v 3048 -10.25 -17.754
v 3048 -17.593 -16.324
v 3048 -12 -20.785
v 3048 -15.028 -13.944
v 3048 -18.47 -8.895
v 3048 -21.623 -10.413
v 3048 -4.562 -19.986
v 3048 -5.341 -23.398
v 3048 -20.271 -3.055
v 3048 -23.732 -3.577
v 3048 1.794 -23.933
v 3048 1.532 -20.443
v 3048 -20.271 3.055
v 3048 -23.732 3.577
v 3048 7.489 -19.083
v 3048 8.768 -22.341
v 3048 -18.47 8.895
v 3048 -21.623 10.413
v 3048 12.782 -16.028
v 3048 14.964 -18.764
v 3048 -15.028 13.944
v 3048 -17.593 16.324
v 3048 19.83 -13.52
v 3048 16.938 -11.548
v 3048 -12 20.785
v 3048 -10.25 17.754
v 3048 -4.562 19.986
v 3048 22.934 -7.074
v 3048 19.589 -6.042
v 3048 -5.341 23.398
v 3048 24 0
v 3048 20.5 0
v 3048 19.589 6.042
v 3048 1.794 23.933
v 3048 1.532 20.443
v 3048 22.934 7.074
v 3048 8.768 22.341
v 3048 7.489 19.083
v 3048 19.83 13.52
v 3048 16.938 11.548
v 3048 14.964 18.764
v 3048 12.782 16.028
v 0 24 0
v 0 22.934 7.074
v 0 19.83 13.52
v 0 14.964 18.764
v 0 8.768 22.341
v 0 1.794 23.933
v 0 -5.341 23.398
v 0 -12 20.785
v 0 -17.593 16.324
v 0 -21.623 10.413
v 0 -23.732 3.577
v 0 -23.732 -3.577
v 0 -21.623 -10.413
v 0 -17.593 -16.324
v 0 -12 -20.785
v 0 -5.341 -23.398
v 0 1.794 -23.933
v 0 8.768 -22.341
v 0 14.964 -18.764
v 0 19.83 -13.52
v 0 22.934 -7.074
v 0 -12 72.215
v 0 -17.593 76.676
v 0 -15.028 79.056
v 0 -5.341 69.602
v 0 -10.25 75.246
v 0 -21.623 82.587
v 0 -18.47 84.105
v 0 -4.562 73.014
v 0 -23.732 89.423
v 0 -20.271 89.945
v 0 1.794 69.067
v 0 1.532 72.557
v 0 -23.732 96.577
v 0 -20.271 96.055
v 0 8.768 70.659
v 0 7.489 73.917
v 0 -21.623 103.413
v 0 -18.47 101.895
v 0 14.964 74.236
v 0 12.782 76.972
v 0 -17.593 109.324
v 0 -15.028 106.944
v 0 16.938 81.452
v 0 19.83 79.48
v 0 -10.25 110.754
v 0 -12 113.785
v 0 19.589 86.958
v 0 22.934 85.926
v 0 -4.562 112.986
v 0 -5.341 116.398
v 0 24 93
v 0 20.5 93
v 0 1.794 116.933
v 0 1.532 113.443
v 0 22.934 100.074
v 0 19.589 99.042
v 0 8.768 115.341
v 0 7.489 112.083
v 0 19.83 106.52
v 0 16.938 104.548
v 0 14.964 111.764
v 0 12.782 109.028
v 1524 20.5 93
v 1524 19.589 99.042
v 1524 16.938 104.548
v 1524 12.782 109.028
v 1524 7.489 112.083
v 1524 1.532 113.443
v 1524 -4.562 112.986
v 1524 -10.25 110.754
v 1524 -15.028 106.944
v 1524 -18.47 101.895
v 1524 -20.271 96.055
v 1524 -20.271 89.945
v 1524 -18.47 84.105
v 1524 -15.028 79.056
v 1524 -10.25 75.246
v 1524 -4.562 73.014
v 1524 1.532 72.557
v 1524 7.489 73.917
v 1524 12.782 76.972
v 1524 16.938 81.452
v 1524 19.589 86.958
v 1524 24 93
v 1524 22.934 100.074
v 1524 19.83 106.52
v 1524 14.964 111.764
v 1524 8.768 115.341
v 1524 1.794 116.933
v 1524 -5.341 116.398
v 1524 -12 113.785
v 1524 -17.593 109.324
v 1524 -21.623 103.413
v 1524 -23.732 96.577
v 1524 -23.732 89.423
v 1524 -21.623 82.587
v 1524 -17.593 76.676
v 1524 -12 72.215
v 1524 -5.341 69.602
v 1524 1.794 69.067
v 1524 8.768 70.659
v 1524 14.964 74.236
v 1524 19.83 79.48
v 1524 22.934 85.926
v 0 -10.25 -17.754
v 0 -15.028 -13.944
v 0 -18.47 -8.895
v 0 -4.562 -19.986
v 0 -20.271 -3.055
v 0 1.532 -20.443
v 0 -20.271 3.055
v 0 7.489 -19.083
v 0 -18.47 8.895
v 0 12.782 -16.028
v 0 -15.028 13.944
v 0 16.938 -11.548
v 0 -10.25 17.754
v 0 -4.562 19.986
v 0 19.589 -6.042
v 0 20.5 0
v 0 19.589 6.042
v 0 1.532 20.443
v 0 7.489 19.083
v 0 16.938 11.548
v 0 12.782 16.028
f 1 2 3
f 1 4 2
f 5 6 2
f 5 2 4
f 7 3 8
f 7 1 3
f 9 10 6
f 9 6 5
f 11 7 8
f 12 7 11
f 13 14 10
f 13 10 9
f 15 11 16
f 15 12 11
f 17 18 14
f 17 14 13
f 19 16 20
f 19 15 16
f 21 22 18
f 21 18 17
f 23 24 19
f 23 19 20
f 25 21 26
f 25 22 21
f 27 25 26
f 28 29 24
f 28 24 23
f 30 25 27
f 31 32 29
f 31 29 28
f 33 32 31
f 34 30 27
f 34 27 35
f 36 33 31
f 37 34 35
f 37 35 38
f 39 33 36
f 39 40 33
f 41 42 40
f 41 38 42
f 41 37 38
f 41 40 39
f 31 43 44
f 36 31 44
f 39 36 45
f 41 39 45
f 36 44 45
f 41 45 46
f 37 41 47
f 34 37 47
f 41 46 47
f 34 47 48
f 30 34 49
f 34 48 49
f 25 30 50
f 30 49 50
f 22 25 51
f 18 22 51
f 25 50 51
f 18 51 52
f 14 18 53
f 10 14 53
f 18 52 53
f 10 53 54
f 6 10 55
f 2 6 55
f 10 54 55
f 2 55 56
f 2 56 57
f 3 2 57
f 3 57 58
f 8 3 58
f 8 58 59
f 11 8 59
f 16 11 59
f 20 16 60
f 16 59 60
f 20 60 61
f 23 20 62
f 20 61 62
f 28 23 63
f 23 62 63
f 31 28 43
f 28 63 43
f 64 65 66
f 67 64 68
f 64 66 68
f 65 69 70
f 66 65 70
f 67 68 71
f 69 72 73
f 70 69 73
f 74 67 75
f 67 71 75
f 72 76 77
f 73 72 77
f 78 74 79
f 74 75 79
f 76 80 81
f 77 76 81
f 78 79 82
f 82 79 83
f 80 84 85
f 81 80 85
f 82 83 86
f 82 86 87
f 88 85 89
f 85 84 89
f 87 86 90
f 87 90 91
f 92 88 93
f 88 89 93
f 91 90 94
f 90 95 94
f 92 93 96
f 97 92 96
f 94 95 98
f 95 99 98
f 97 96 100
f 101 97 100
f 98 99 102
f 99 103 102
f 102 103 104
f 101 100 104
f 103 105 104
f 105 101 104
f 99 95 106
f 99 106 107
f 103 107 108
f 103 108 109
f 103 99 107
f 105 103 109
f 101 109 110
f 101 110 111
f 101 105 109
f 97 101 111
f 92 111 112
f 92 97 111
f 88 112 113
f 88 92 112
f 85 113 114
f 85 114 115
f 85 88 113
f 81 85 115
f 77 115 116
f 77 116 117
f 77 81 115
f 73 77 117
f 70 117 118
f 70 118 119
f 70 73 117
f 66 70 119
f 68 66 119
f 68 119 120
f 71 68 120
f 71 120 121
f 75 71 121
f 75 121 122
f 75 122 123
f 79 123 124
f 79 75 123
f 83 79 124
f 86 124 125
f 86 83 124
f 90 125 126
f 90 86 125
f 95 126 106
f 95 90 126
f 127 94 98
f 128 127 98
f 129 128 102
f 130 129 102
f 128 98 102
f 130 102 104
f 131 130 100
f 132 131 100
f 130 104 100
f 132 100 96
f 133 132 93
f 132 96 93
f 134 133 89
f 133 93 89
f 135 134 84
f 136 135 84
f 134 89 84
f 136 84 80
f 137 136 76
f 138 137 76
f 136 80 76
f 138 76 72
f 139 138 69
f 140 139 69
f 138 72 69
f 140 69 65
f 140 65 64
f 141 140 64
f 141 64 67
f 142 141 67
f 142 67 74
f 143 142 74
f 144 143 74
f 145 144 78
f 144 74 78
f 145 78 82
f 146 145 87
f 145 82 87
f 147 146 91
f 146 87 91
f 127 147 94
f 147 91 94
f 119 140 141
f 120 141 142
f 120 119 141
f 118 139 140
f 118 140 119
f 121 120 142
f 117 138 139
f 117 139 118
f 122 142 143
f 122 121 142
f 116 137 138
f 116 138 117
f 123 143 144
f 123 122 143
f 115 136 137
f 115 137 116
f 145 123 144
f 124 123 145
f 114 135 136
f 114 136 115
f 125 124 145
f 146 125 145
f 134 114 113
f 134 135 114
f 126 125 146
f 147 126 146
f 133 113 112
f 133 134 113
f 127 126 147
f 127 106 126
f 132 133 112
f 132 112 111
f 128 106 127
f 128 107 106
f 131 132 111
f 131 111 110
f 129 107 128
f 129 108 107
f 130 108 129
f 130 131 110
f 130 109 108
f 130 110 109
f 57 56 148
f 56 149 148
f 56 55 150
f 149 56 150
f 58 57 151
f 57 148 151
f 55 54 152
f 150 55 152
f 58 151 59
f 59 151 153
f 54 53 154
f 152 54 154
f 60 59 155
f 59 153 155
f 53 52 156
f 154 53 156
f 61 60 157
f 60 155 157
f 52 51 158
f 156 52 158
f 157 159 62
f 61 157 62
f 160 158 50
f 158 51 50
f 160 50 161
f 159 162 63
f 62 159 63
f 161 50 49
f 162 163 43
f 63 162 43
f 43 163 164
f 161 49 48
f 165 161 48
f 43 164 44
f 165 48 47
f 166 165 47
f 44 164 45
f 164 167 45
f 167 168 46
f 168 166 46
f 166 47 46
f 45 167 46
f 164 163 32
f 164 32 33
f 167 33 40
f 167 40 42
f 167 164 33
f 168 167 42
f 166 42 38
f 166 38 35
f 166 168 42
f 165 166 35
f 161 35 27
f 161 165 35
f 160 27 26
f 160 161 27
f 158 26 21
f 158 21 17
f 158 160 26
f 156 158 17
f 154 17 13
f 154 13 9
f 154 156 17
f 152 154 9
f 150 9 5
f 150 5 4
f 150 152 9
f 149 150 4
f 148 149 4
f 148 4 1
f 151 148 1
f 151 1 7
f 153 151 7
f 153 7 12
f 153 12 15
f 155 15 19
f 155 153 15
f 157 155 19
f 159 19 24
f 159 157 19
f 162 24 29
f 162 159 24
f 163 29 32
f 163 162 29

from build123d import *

# Parameters (mm, degrees)
F0_R     = 24
F0_R_2   = 20.5
F1_DEPTH = 3048
F2_R     = 24
F2_R_2   = 20.5
F3_DEPTH = 1524


with BuildPart() as f1:
    # F0 (on Right) → F1 (new body)
    with BuildSketch(Plane.YZ):
        Circle(F0_R)
        Circle(F0_R_2, mode=Mode.SUBTRACT)
    extrude(amount=F1_DEPTH)


with BuildPart() as f3:
    # F2 (on Right) → F3 (new body)
    with BuildSketch(Plane.YZ):
        with Locations((0, 93.00001)):
            Circle(F2_R)
        with Locations((0, 93.00001)):
            Circle(F2_R_2, mode=Mode.SUBTRACT)
    extrude(amount=F3_DEPTH)


solid = Compound([f1.part, f3.part])
